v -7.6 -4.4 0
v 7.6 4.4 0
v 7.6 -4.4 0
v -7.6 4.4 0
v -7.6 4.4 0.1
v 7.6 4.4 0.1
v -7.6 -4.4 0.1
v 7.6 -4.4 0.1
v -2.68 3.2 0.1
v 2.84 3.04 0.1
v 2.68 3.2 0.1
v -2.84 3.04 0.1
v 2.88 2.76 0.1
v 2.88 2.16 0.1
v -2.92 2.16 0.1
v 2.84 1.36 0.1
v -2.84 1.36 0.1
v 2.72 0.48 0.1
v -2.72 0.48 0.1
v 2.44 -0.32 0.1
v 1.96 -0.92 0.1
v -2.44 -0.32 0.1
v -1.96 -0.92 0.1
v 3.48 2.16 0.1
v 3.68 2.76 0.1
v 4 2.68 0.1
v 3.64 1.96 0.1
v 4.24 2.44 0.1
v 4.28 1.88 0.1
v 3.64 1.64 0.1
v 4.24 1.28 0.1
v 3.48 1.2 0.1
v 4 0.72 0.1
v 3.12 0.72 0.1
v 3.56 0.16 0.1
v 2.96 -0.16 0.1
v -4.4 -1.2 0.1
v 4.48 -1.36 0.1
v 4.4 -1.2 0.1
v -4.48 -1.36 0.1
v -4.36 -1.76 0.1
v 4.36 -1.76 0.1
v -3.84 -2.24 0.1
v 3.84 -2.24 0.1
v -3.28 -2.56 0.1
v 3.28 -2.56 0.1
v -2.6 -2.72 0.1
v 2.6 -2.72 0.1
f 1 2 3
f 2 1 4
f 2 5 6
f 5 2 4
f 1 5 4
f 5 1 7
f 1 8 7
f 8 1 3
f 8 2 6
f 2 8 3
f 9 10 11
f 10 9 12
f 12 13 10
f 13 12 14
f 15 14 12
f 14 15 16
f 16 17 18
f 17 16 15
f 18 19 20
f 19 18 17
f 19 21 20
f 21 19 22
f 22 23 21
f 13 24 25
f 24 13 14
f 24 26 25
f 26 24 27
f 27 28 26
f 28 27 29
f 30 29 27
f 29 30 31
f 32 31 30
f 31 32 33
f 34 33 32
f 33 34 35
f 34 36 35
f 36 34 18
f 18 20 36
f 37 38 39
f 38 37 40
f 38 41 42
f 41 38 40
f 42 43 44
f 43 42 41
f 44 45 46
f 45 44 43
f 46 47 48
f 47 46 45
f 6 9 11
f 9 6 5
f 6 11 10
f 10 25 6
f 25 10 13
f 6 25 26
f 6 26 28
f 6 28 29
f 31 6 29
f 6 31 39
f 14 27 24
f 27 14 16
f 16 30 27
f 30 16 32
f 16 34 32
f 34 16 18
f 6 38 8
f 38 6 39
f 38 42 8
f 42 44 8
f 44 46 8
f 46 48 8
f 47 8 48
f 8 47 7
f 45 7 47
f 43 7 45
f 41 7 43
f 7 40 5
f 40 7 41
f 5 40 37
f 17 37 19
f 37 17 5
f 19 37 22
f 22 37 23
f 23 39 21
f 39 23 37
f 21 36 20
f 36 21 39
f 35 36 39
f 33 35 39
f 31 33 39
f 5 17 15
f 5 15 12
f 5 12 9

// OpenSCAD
// file: ../p/box5-12.scad
use <../lib.scad>
function ldraw_lib__box5_12() = [
// 0 Box with 5 Faces without Any Edges
// 0 Name: box5-12.dat
// 0 Author: Chris Dee [cwdee]
// 0 !LDRAW_ORG Primitive UPDATE 2009-02
// 0 !LICENSE Licensed under CC BY 2.0 and CC BY 4.0 : see CAreadme.txt
// 
// 0 BFC CERTIFY CCW
  [0,"BFC","CERTIFY"],
  [0,"BFC","CCW"],
// 
// 0 !HISTORY 2009-09-03 [PTadmin] Official Update 2009-02
// 
// 
// 4 16 1 1 1 1 1 -1 -1 1 -1 -1 1 1
  [4,16,1,1,1,1,1,-1,-1,1,-1,-1,1,1],
// 4 16 -1 0 1 1 0 1 1 1 1 -1 1 1
  [4,16,-1,0,1,1,0,1,1,1,1,-1,1,1],
// 4 16 -1 0 -1 -1 0 1 -1 1 1 -1 1 -1
  [4,16,-1,0,-1,-1,0,1,-1,1,1,-1,1,-1],
// 4 16 1 0 -1 -1 0 -1 -1 1 -1 1 1 -1
  [4,16,1,0,-1,-1,0,-1,-1,1,-1,1,1,-1],
// 4 16 1 0 1 1 0 -1 1 1 -1 1 1 1
  [4,16,1,0,1,1,0,-1,1,1,-1,1,1,1],
// 0
];
makepoly(ldraw_lib__box5_12(), line=0.2);
// main file
use <../lib.scad>
use <../p/box5-12.scad>
function ldraw_lib__164555d() = [
// 0 Sticker  1.1 x  1.9 with Black Cup and Saucer on Transparent Background
// 0 Name: 164555d.dat
// 0 Author: Takeshi Takahashi [RainbowDolphin]
// 0 !LDRAW_ORG Part UPDATE 2022-06
// 0 !LICENSE Licensed under CC BY 2.0 and CC BY 4.0 : see CAreadme.txt
// 
// 0 BFC CERTIFY CCW
  [0,"BFC","CERTIFY"],
  [0,"BFC","CCW"],
// 
// 0 !KEYWORDS Bricklink 4554stk01, Brickowl 156966, Coffee, Rebrickable 164555
// 0 !KEYWORDS Set 4554, Shop, Station, Train
// 
// 0 !HISTORY 2022-12-20 [PTadmin] Official Update 2022-06
// 
// 
// 1 16 0 -0.25 0 19 0 0 0 0.25 0 0 0 11 box5-12.dat
  [1,16,0,-0.25,0,19,0,0,0,0.25,0,0,0,11, ldraw_lib__box5_12()],
// 0 BFC NOCLIP
  [0,"BFC","NOCLIP"],
// 4 0 7.1 -0.25 7.6 6.7 -0.25 8 -6.7 -0.25 8 -7.1 -0.25 7.6
  [4,0,7.1,-0.25,7.6,6.7,-0.25,8,-6.7,-0.25,8,-7.1,-0.25,7.6],
// 4 0 7.2 -0.25 6.9 7.1 -0.25 7.6 -7.1 -0.25 7.6 7.2 -0.25 5.4
  [4,0,7.2,-0.25,6.9,7.1,-0.25,7.6,-7.1,-0.25,7.6,7.2,-0.25,5.4],
// 4 0 7.2 -0.25 5.4 -7.1 -0.25 7.6 -7.3 -0.25 5.4 7.1 -0.25 3.4
  [4,0,7.2,-0.25,5.4,-7.1,-0.25,7.6,-7.3,-0.25,5.4,7.1,-0.25,3.4],
// 4 0 7.1 -0.25 3.4 -7.3 -0.25 5.4 -7.1 -0.25 3.4 6.8 -0.25 1.2
  [4,0,7.1,-0.25,3.4,-7.3,-0.25,5.4,-7.1,-0.25,3.4,6.8,-0.25,1.2],
// 4 0 6.8 -0.25 1.2 -7.1 -0.25 3.4 -6.8 -0.25 1.2 6.1 -0.25 -0.8
  [4,0,6.8,-0.25,1.2,-7.1,-0.25,3.4,-6.8,-0.25,1.2,6.1,-0.25,-0.8],
// 4 0 6.1 -0.25 -0.8 -6.8 -0.25 1.2 -6.1 -0.25 -0.8 4.9 -0.25 -2.3
  [4,0,6.1,-0.25,-0.8,-6.8,-0.25,1.2,-6.1,-0.25,-0.8,4.9,-0.25,-2.3],
// 3 0 -6.1 -0.25 -0.8 -4.9 -0.25 -2.3 4.9 -0.25 -2.3
  [3,0,-6.1,-0.25,-0.8,-4.9,-0.25,-2.3,4.9,-0.25,-2.3],
// 4 0 7.2 -0.25 6.9 7.2 -0.25 5.4 8.7 -0.25 5.4 9.2 -0.25 6.9
  [4,0,7.2,-0.25,6.9,7.2,-0.25,5.4,8.7,-0.25,5.4,9.2,-0.25,6.9],
// 4 0 10 -0.25 6.7 9.2 -0.25 6.9 8.7 -0.25 5.4 9.1 -0.25 4.9
  [4,0,10,-0.25,6.7,9.2,-0.25,6.9,8.7,-0.25,5.4,9.1,-0.25,4.9],
// 4 0 10.6 -0.25 6.1 10 -0.25 6.7 9.1 -0.25 4.9 10.7 -0.25 4.7
  [4,0,10.6,-0.25,6.1,10,-0.25,6.7,9.1,-0.25,4.9,10.7,-0.25,4.7],
// 4 0 10.7 -0.25 4.7 9.1 -0.25 4.9 9.1 -0.25 4.1 10.6 -0.25 3.2
  [4,0,10.7,-0.25,4.7,9.1,-0.25,4.9,9.1,-0.25,4.1,10.6,-0.25,3.2],
// 4 0 10.6 -0.25 3.2 9.1 -0.25 4.1 8.7 -0.25 3 10 -0.25 1.8
  [4,0,10.6,-0.25,3.2,9.1,-0.25,4.1,8.7,-0.25,3,10,-0.25,1.8],
// 4 0 10 -0.25 1.8 8.7 -0.25 3 7.8 -0.25 1.8 8.9 -0.25 0.4
  [4,0,10,-0.25,1.8,8.7,-0.25,3,7.8,-0.25,1.8,8.9,-0.25,0.4],
// 4 0 8.9 -0.25 0.4 7.8 -0.25 1.8 6.8 -0.25 1.2 7.4 -0.25 -0.4
  [4,0,8.9,-0.25,0.4,7.8,-0.25,1.8,6.8,-0.25,1.2,7.4,-0.25,-0.4],
// 3 0 6.8 -0.25 1.2 6.1 -0.25 -0.8 7.4 -0.25 -0.4
  [3,0,6.8,-0.25,1.2,6.1,-0.25,-0.8,7.4,-0.25,-0.4],
// 4 0 11 -0.25 -3 -11 -0.25 -3 -11.2 -0.25 -3.4 11.2 -0.25 -3.4
  [4,0,11,-0.25,-3,-11,-0.25,-3,-11.2,-0.25,-3.4,11.2,-0.25,-3.4],
// 4 0 11.2 -0.25 -3.4 -11.2 -0.25 -3.4 -10.9 -0.25 -4.4 10.9 -0.25 -4.4
  [4,0,11.2,-0.25,-3.4,-11.2,-0.25,-3.4,-10.9,-0.25,-4.4,10.9,-0.25,-4.4],
// 4 0 10.9 -0.25 -4.4 -10.9 -0.25 -4.4 -9.6 -0.25 -5.6 9.6 -0.25 -5.6
  [4,0,10.9,-0.25,-4.4,-10.9,-0.25,-4.4,-9.6,-0.25,-5.6,9.6,-0.25,-5.6],
// 4 0 9.6 -0.25 -5.6 -9.6 -0.25 -5.6 -8.2 -0.25 -6.4 8.2 -0.25 -6.4
  [4,0,9.6,-0.25,-5.6,-9.6,-0.25,-5.6,-8.2,-0.25,-6.4,8.2,-0.25,-6.4],
// 4 0 8.2 -0.25 -6.4 -8.2 -0.25 -6.4 -6.5 -0.25 -6.8 6.5 -0.25 -6.8
  [4,0,8.2,-0.25,-6.4,-8.2,-0.25,-6.4,-6.5,-0.25,-6.8,6.5,-0.25,-6.8],
// 0 BFC CLIP
  [0,"BFC","CLIP"],
// 4 16 19 -0.25 11 -19 -0.25 11 -6.7 -0.25 8 6.7 -0.25 8
  [4,16,19,-0.25,11,-19,-0.25,11,-6.7,-0.25,8,6.7,-0.25,8],
// 3 16 19 -0.25 11 6.7 -0.25 8 7.1 -0.25 7.6
  [3,16,19,-0.25,11,6.7,-0.25,8,7.1,-0.25,7.6],
// 4 16 19 -0.25 11 7.1 -0.25 7.6 7.2 -0.25 6.9 9.2 -0.25 6.9
  [4,16,19,-0.25,11,7.1,-0.25,7.6,7.2,-0.25,6.9,9.2,-0.25,6.9],
// 3 16 19 -0.25 11 9.2 -0.25 6.9 10 -0.25 6.7
  [3,16,19,-0.25,11,9.2,-0.25,6.9,10,-0.25,6.7],
// 3 16 19 -0.25 11 10 -0.25 6.7 10.6 -0.25 6.1
  [3,16,19,-0.25,11,10,-0.25,6.7,10.6,-0.25,6.1],
// 3 16 19 -0.25 11 10.6 -0.25 6.1 10.7 -0.25 4.7
  [3,16,19,-0.25,11,10.6,-0.25,6.1,10.7,-0.25,4.7],
// 4 16 19 -0.25 11 10.7 -0.25 4.7 10.6 -0.25 3.2 11 -0.25 -3
  [4,16,19,-0.25,11,10.7,-0.25,4.7,10.6,-0.25,3.2,11,-0.25,-3],
// 4 16 9.1 -0.25 4.9 8.7 -0.25 5.4 7.2 -0.25 5.4 7.1 -0.25 3.4
  [4,16,9.1,-0.25,4.9,8.7,-0.25,5.4,7.2,-0.25,5.4,7.1,-0.25,3.4],
// 4 16 9.1 -0.25 4.1 9.1 -0.25 4.9 7.1 -0.25 3.4 8.7 -0.25 3
  [4,16,9.1,-0.25,4.1,9.1,-0.25,4.9,7.1,-0.25,3.4,8.7,-0.25,3],
// 4 16 7.8 -0.25 1.8 8.7 -0.25 3 7.1 -0.25 3.4 6.8 -0.25 1.2
  [4,16,7.8,-0.25,1.8,8.7,-0.25,3,7.1,-0.25,3.4,6.8,-0.25,1.2],
// 4 16 19 -0.25 11 11 -0.25 -3 11.2 -0.25 -3.4 19 -0.25 -11
  [4,16,19,-0.25,11,11,-0.25,-3,11.2,-0.25,-3.4,19,-0.25,-11],
// 3 16 11.2 -0.25 -3.4 10.9 -0.25 -4.4 19 -0.25 -11
  [3,16,11.2,-0.25,-3.4,10.9,-0.25,-4.4,19,-0.25,-11],
// 3 16 10.9 -0.25 -4.4 9.6 -0.25 -5.6 19 -0.25 -11
  [3,16,10.9,-0.25,-4.4,9.6,-0.25,-5.6,19,-0.25,-11],
// 3 16 9.6 -0.25 -5.6 8.2 -0.25 -6.4 19 -0.25 -11
  [3,16,9.6,-0.25,-5.6,8.2,-0.25,-6.4,19,-0.25,-11],
// 3 16 8.2 -0.25 -6.4 6.5 -0.25 -6.8 19 -0.25 -11
  [3,16,8.2,-0.25,-6.4,6.5,-0.25,-6.8,19,-0.25,-11],
// 4 16 19 -0.25 -11 6.5 -0.25 -6.8 -6.5 -0.25 -6.8 -19 -0.25 -11
  [4,16,19,-0.25,-11,6.5,-0.25,-6.8,-6.5,-0.25,-6.8,-19,-0.25,-11],
// 3 16 -8.2 -0.25 -6.4 -19 -0.25 -11 -6.5 -0.25 -6.8
  [3,16,-8.2,-0.25,-6.4,-19,-0.25,-11,-6.5,-0.25,-6.8],
// 3 16 -9.6 -0.25 -5.6 -19 -0.25 -11 -8.2 -0.25 -6.4
  [3,16,-9.6,-0.25,-5.6,-19,-0.25,-11,-8.2,-0.25,-6.4],
// 3 16 -10.9 -0.25 -4.4 -19 -0.25 -11 -9.6 -0.25 -5.6
  [3,16,-10.9,-0.25,-4.4,-19,-0.25,-11,-9.6,-0.25,-5.6],
// 4 16 -19 -0.25 -11 -10.9 -0.25 -4.4 -11.2 -0.25 -3.4 -19 -0.25 11
  [4,16,-19,-0.25,-11,-10.9,-0.25,-4.4,-11.2,-0.25,-3.4,-19,-0.25,11],
// 3 16 -19 -0.25 11 -11.2 -0.25 -3.4 -11 -0.25 -3
  [3,16,-19,-0.25,11,-11.2,-0.25,-3.4,-11,-0.25,-3],
// 4 16 -7.1 -0.25 3.4 -19 -0.25 11 -11 -0.25 -3 -6.8 -0.25 1.2
  [4,16,-7.1,-0.25,3.4,-19,-0.25,11,-11,-0.25,-3,-6.8,-0.25,1.2],
// 3 16 -6.8 -0.25 1.2 -11 -0.25 -3 -6.1 -0.25 -0.8
  [3,16,-6.8,-0.25,1.2,-11,-0.25,-3,-6.1,-0.25,-0.8],
// 3 16 -6.1 -0.25 -0.8 -11 -0.25 -3 -4.9 -0.25 -2.3
  [3,16,-6.1,-0.25,-0.8,-11,-0.25,-3,-4.9,-0.25,-2.3],
// 4 16 4.9 -0.25 -2.3 -4.9 -0.25 -2.3 -11 -0.25 -3 11 -0.25 -3
  [4,16,4.9,-0.25,-2.3,-4.9,-0.25,-2.3,-11,-0.25,-3,11,-0.25,-3],
// 4 16 6.1 -0.25 -0.8 4.9 -0.25 -2.3 11 -0.25 -3 7.4 -0.25 -0.4
  [4,16,6.1,-0.25,-0.8,4.9,-0.25,-2.3,11,-0.25,-3,7.4,-0.25,-0.4],
// 3 16 8.9 -0.25 0.4 7.4 -0.25 -0.4 11 -0.25 -3
  [3,16,8.9,-0.25,0.4,7.4,-0.25,-0.4,11,-0.25,-3],
// 3 16 10 -0.25 1.8 8.9 -0.25 0.4 11 -0.25 -3
  [3,16,10,-0.25,1.8,8.9,-0.25,0.4,11,-0.25,-3],
// 3 16 10.6 -0.25 3.2 10 -0.25 1.8 11 -0.25 -3
  [3,16,10.6,-0.25,3.2,10,-0.25,1.8,11,-0.25,-3],
// 3 16 -19 -0.25 11 -7.1 -0.25 3.4 -7.3 -0.25 5.4
  [3,16,-19,-0.25,11,-7.1,-0.25,3.4,-7.3,-0.25,5.4],
// 3 16 -19 -0.25 11 -7.3 -0.25 5.4 -7.1 -0.25 7.6
  [3,16,-19,-0.25,11,-7.3,-0.25,5.4,-7.1,-0.25,7.6],
// 3 16 -19 -0.25 11 -7.1 -0.25 7.6 -6.7 -0.25 8
  [3,16,-19,-0.25,11,-7.1,-0.25,7.6,-6.7,-0.25,8],
];
makepoly(ldraw_lib__164555d(), line=0.2);
